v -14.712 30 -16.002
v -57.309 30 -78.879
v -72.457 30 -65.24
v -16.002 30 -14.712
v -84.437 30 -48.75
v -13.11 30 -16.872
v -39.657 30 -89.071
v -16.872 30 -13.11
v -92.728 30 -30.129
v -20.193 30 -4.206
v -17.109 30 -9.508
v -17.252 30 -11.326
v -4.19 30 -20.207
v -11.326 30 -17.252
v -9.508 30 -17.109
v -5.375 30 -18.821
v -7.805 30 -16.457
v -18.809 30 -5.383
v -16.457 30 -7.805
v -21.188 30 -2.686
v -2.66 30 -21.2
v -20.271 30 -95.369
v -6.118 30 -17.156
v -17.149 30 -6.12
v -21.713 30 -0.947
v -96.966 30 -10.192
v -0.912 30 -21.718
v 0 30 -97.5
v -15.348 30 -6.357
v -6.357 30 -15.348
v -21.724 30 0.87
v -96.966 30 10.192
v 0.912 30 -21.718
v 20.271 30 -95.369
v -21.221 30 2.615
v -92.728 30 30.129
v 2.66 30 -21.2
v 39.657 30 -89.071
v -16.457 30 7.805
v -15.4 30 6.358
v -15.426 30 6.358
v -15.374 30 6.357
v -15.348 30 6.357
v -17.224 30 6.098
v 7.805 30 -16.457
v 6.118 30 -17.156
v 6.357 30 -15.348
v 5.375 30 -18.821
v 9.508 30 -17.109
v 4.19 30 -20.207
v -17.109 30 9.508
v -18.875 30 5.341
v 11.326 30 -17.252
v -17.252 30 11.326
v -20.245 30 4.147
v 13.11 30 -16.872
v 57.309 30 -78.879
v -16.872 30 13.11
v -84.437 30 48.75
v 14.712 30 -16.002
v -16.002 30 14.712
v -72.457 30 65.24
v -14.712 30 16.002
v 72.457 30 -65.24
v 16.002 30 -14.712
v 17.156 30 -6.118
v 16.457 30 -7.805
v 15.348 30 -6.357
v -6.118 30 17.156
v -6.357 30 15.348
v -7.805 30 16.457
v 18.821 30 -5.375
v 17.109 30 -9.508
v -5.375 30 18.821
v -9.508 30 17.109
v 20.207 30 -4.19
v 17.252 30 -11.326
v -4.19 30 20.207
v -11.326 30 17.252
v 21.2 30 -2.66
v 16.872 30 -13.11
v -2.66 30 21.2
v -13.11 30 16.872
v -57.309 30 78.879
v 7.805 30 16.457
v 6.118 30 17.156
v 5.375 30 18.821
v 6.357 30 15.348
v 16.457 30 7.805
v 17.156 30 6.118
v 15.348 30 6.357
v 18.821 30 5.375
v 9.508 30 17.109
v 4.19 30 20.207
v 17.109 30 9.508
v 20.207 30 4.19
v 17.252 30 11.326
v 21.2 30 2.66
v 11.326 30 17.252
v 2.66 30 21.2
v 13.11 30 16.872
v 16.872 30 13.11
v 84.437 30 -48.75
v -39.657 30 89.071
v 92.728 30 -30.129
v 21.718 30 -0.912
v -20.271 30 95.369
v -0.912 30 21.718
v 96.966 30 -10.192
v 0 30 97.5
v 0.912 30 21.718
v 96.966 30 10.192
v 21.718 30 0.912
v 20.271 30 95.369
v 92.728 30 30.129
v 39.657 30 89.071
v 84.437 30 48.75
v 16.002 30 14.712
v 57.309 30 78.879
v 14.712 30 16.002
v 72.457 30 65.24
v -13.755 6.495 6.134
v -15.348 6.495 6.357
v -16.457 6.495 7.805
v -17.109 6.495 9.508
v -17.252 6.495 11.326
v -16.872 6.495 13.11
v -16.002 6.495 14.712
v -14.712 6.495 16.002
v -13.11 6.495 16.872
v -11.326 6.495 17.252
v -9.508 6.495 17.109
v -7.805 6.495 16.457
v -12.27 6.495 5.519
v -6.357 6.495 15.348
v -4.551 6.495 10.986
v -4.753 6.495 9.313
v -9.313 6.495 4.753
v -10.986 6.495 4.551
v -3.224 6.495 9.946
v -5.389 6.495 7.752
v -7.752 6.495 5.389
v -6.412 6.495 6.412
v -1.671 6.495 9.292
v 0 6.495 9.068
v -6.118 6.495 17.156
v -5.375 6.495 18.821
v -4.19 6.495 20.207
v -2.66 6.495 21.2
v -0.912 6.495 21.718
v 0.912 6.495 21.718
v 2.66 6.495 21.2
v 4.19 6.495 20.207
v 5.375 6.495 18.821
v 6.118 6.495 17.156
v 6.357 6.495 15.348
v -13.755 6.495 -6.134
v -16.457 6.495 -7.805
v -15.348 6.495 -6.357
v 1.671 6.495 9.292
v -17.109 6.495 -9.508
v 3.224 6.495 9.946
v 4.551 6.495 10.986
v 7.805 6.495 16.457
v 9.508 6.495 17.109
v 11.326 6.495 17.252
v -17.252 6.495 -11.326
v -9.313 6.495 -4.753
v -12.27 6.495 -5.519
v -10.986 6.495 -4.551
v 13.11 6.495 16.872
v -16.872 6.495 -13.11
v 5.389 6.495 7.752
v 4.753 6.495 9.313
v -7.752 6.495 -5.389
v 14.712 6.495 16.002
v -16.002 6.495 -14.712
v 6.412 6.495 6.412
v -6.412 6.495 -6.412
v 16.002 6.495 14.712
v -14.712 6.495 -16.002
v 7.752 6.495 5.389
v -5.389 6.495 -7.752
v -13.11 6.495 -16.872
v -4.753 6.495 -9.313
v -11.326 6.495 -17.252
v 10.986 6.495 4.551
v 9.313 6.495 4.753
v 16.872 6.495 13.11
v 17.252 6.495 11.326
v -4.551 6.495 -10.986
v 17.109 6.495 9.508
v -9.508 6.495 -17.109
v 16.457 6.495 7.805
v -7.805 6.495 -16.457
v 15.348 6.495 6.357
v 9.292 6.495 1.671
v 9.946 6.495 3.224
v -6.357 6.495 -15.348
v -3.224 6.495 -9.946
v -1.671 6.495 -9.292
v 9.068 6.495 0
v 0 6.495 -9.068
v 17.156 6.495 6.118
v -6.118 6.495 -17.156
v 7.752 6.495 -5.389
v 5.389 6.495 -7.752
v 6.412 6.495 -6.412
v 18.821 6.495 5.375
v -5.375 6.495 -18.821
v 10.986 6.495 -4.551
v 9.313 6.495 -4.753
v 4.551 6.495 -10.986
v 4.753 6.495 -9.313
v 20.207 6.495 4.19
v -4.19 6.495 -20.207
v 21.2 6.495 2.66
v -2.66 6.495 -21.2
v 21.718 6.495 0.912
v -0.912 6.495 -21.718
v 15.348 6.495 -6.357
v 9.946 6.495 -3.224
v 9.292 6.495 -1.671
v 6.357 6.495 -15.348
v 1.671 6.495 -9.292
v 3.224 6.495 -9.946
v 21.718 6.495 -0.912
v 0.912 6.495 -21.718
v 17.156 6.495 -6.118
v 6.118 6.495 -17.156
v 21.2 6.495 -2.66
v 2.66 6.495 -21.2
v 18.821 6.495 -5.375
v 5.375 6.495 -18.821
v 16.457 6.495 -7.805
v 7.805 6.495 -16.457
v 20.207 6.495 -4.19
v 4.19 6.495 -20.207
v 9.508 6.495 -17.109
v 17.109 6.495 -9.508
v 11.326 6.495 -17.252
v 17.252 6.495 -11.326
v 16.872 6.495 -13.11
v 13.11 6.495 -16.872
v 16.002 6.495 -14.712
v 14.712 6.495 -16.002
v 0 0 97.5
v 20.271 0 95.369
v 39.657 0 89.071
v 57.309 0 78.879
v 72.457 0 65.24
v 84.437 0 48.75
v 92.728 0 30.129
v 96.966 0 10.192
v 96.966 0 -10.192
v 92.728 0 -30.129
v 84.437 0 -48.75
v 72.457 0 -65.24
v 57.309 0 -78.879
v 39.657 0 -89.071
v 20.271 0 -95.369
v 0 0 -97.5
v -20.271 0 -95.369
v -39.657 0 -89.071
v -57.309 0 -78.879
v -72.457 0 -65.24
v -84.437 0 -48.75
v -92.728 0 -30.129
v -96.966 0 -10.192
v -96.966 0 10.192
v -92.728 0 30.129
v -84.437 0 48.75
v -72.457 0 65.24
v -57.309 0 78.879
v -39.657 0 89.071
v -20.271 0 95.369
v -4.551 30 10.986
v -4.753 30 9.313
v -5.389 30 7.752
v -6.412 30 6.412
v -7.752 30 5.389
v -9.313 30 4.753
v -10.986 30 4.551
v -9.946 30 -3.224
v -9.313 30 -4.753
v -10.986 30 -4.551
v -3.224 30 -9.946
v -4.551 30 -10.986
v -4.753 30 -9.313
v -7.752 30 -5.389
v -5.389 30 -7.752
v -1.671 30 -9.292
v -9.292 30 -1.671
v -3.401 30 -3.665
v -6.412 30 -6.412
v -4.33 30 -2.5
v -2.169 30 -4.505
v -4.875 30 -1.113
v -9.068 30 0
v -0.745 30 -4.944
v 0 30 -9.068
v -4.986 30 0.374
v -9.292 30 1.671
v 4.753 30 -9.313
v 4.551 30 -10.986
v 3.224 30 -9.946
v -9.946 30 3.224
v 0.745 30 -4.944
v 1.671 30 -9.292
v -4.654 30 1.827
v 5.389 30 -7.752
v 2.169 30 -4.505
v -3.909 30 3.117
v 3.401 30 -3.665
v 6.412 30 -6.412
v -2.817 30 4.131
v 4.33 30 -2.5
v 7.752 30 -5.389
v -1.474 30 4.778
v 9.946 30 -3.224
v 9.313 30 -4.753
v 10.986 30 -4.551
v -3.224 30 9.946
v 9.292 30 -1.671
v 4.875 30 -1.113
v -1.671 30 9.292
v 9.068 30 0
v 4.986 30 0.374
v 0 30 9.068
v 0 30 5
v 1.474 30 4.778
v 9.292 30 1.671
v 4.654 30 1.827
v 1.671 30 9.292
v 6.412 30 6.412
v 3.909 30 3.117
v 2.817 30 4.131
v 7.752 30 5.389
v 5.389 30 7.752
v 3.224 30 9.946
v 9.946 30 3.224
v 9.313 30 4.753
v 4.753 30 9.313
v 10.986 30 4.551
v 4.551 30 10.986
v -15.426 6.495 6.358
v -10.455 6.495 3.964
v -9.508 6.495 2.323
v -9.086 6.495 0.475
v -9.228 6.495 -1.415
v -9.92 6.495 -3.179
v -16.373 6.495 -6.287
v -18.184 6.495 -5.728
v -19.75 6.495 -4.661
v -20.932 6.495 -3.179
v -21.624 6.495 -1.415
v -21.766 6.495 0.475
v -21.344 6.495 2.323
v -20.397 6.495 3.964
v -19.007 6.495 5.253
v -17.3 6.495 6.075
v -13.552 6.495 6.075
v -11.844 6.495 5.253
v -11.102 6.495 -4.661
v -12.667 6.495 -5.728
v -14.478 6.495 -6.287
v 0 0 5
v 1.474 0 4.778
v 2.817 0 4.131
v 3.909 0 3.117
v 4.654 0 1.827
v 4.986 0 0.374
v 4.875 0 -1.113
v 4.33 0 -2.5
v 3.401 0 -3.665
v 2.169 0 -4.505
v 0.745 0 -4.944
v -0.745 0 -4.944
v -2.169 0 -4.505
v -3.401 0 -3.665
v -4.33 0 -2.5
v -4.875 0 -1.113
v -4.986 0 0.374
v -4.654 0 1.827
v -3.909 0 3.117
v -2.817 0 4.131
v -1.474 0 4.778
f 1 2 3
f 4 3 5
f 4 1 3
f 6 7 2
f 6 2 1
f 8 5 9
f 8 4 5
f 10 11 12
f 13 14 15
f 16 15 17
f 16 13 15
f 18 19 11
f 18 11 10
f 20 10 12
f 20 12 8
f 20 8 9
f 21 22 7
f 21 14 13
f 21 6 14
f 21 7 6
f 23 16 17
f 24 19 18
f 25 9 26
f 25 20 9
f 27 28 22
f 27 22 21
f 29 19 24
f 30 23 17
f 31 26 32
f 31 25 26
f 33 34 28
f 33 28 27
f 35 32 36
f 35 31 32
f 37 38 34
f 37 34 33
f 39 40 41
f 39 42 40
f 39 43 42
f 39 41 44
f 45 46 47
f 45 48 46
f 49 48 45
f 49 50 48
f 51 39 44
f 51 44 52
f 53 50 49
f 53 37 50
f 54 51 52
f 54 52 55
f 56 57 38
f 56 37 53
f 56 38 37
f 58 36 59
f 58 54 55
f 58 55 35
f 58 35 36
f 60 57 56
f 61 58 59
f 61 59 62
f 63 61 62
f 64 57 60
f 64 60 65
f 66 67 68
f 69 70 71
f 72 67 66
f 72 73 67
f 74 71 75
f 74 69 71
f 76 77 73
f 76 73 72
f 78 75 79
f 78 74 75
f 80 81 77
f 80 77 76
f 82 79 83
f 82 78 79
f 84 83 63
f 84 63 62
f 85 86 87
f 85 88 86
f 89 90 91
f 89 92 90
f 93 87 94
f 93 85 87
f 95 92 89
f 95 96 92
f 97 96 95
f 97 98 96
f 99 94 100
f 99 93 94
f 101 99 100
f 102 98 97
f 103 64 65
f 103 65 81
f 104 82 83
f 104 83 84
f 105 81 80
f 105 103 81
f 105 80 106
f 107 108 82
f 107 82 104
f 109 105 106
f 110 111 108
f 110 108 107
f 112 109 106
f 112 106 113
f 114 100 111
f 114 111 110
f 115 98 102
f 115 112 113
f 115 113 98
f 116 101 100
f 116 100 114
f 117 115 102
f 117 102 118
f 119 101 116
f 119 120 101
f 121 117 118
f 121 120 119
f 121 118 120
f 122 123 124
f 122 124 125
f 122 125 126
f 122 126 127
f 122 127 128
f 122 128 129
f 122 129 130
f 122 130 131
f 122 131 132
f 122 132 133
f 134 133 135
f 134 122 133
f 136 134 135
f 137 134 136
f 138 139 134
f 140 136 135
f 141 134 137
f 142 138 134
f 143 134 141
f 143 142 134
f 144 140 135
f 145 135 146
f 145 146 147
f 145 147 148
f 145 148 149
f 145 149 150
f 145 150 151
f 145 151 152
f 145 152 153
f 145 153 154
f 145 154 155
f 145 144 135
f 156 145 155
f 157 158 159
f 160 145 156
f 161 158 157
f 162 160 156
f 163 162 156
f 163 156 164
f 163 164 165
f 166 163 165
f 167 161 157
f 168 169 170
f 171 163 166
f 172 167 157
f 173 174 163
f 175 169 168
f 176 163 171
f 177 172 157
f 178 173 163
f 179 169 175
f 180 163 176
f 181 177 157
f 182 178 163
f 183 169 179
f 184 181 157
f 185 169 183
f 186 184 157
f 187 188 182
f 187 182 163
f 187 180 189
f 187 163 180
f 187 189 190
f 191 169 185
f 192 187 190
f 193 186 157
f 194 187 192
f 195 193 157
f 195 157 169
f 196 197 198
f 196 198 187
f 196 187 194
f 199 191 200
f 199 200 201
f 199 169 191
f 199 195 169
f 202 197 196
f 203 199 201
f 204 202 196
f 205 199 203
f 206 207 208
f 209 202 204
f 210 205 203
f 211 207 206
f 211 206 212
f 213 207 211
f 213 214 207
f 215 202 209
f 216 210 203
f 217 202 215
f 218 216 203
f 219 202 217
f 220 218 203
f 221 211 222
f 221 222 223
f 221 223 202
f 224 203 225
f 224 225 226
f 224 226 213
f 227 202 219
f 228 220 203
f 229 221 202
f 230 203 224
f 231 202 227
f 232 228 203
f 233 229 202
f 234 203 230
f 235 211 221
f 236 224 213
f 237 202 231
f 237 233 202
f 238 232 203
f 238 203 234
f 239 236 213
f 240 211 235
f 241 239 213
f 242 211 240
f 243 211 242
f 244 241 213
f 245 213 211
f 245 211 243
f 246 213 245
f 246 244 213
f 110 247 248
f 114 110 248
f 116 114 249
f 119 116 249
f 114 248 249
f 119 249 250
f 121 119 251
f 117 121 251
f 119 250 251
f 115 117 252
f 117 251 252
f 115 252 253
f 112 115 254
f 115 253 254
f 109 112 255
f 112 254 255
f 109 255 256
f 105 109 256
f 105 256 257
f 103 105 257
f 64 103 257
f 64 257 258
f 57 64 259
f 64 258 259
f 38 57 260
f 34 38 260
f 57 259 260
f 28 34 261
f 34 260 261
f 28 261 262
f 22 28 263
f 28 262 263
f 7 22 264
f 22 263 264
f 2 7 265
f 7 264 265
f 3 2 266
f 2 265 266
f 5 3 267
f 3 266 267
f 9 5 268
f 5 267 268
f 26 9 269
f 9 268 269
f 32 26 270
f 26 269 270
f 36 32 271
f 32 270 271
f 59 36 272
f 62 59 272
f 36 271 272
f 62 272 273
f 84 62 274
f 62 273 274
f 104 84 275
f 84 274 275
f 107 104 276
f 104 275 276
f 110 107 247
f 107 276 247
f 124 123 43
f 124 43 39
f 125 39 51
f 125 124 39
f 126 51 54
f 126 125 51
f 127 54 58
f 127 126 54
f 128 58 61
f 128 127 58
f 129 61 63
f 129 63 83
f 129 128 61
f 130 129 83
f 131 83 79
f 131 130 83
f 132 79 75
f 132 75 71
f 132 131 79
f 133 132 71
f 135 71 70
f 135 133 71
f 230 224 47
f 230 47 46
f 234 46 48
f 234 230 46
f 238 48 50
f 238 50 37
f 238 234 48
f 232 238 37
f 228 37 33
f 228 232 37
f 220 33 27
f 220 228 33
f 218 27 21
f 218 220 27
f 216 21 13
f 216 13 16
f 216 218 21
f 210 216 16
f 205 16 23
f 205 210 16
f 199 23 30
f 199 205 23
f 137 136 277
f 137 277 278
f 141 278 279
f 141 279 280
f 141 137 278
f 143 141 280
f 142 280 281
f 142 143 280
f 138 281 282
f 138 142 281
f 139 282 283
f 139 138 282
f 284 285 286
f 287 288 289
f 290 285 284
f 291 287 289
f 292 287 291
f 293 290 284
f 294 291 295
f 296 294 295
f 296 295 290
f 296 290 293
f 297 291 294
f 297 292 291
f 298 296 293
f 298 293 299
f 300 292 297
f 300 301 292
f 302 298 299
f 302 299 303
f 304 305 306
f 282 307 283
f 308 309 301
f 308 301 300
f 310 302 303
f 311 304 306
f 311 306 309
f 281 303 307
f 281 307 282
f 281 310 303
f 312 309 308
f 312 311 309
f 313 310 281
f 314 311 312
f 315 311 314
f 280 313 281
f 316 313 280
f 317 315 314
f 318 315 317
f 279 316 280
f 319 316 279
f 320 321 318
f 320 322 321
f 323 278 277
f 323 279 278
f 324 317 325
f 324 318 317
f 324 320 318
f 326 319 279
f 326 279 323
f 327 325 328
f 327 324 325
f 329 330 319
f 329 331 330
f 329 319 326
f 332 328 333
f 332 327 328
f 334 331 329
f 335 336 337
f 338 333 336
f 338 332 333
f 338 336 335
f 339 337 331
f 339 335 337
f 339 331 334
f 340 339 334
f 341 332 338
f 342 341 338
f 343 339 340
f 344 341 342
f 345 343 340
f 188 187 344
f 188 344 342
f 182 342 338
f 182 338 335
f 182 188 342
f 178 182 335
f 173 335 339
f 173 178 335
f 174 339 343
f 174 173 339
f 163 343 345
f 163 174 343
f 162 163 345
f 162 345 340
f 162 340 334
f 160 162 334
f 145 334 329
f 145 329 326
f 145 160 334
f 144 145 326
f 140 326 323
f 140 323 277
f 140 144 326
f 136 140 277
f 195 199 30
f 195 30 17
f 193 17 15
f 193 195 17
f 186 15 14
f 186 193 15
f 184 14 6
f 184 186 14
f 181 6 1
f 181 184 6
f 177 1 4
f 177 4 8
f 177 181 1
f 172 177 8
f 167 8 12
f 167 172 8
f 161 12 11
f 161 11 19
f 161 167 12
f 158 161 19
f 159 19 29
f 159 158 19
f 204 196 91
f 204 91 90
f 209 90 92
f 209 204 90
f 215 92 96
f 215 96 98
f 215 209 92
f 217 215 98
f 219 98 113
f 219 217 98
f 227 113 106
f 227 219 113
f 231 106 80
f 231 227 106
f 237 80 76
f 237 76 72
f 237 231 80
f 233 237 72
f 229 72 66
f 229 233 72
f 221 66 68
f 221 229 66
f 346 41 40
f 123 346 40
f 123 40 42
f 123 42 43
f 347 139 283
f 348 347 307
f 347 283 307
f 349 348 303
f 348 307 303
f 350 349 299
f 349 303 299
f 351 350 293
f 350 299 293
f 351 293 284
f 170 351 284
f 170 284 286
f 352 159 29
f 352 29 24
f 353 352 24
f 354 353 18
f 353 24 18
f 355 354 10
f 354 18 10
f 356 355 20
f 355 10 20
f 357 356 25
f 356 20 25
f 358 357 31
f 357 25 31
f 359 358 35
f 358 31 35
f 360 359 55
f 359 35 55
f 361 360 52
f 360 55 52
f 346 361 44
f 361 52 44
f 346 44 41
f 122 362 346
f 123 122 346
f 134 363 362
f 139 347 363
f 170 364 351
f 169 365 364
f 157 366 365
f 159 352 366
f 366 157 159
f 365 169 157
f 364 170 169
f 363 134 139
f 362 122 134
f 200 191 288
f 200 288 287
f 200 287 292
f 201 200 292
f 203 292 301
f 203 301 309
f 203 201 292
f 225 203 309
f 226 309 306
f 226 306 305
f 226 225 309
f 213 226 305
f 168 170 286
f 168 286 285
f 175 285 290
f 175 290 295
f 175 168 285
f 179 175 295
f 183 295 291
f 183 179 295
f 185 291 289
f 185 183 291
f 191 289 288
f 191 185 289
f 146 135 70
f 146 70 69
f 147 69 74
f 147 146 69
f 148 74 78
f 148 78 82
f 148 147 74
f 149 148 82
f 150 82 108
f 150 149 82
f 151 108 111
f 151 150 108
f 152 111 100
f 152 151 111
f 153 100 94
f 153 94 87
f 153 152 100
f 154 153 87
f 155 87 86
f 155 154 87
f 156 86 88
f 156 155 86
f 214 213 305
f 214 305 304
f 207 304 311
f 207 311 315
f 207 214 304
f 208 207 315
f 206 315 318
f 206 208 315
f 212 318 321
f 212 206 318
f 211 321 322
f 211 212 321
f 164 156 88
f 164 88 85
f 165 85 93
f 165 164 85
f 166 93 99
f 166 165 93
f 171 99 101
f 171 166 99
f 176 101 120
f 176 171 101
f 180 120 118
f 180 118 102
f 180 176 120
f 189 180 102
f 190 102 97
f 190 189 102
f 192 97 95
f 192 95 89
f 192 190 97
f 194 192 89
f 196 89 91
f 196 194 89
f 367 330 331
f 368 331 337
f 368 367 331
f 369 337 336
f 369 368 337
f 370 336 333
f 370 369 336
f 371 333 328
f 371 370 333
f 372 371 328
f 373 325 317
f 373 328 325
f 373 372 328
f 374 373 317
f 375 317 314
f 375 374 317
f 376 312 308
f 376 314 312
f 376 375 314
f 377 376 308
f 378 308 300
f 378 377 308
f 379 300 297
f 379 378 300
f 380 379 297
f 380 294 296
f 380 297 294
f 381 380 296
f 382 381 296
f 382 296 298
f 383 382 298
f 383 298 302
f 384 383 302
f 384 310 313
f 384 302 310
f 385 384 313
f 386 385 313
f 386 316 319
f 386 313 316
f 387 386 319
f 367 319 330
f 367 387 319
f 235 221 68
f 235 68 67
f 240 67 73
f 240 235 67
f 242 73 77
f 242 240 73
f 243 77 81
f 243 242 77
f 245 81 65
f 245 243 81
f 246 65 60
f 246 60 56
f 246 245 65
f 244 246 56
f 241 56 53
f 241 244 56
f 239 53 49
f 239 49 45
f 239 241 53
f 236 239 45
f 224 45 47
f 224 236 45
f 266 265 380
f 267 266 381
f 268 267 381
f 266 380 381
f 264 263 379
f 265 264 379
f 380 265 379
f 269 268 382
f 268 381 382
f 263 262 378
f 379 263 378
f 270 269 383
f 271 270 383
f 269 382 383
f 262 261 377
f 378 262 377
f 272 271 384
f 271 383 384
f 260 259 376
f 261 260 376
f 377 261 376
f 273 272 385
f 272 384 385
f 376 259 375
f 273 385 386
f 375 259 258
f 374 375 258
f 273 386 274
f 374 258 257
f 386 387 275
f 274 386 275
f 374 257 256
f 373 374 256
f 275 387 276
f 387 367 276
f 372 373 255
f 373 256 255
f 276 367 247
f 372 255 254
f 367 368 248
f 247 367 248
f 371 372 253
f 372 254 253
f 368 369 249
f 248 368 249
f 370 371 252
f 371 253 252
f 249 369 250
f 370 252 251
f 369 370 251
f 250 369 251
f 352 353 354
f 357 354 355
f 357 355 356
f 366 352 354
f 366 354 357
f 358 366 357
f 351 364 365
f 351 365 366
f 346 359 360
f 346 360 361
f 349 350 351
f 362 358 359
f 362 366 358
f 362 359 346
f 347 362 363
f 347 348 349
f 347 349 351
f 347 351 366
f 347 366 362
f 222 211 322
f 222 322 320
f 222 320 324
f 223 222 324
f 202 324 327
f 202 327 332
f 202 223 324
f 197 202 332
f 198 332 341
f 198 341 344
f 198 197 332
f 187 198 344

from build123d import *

# Parameters (mm, degrees)
SKETCH1_R           = 97.5
BOSS_EXTRUDE1_DEPTH = 30
SKETCH2_R           = 5
CUT_EXTRUDE1_DEPTH  = 142.111657917
SKETCH3_R           = 6.357711216
CUT_EXTRUDE2_DEPTH  = 23.505333603
CIRPATTERN1_COUNT   = 8


with BuildPart() as part:
    # Sketch1 → Boss-Extrude1 (new body)
    with BuildSketch(Plane(origin=(0, 0, 0), x_dir=(1, 0, 0), z_dir=(0, 1, 0))):
        Circle(SKETCH1_R)
    extrude(amount=BOSS_EXTRUDE1_DEPTH)

    # Sketch2 → Cut-Extrude1 (cut, through all)
    with BuildSketch(Plane(origin=(0, 0, 0), x_dir=(1, 0, 0), z_dir=(0, 1, 0))):
        Circle(SKETCH2_R)
    extrude(amount=CUT_EXTRUDE1_DEPTH, mode=Mode.SUBTRACT)

    # Sketch3 → Cut-Extrude2 (cut)
    with BuildSketch(Plane(origin=(0, 30, 0), x_dir=(1, 0, 0), z_dir=(0, 1, 0))):
        with Locations((-15.425910616, 0)):
            Circle(SKETCH3_R)
    cut_extrude2 = extrude(amount=-CUT_EXTRUDE2_DEPTH, mode=Mode.SUBTRACT)

    # CirPattern1: Cut-Extrude2 ×8 about axis
    cirpattern1_axis = Axis((0, 0, 0), (0, 1, 0))
    for i in range(1, CIRPATTERN1_COUNT):
        add(cut_extrude2.rotate(cirpattern1_axis, i * 360 / CIRPATTERN1_COUNT), mode=Mode.SUBTRACT)


solid = part.part
